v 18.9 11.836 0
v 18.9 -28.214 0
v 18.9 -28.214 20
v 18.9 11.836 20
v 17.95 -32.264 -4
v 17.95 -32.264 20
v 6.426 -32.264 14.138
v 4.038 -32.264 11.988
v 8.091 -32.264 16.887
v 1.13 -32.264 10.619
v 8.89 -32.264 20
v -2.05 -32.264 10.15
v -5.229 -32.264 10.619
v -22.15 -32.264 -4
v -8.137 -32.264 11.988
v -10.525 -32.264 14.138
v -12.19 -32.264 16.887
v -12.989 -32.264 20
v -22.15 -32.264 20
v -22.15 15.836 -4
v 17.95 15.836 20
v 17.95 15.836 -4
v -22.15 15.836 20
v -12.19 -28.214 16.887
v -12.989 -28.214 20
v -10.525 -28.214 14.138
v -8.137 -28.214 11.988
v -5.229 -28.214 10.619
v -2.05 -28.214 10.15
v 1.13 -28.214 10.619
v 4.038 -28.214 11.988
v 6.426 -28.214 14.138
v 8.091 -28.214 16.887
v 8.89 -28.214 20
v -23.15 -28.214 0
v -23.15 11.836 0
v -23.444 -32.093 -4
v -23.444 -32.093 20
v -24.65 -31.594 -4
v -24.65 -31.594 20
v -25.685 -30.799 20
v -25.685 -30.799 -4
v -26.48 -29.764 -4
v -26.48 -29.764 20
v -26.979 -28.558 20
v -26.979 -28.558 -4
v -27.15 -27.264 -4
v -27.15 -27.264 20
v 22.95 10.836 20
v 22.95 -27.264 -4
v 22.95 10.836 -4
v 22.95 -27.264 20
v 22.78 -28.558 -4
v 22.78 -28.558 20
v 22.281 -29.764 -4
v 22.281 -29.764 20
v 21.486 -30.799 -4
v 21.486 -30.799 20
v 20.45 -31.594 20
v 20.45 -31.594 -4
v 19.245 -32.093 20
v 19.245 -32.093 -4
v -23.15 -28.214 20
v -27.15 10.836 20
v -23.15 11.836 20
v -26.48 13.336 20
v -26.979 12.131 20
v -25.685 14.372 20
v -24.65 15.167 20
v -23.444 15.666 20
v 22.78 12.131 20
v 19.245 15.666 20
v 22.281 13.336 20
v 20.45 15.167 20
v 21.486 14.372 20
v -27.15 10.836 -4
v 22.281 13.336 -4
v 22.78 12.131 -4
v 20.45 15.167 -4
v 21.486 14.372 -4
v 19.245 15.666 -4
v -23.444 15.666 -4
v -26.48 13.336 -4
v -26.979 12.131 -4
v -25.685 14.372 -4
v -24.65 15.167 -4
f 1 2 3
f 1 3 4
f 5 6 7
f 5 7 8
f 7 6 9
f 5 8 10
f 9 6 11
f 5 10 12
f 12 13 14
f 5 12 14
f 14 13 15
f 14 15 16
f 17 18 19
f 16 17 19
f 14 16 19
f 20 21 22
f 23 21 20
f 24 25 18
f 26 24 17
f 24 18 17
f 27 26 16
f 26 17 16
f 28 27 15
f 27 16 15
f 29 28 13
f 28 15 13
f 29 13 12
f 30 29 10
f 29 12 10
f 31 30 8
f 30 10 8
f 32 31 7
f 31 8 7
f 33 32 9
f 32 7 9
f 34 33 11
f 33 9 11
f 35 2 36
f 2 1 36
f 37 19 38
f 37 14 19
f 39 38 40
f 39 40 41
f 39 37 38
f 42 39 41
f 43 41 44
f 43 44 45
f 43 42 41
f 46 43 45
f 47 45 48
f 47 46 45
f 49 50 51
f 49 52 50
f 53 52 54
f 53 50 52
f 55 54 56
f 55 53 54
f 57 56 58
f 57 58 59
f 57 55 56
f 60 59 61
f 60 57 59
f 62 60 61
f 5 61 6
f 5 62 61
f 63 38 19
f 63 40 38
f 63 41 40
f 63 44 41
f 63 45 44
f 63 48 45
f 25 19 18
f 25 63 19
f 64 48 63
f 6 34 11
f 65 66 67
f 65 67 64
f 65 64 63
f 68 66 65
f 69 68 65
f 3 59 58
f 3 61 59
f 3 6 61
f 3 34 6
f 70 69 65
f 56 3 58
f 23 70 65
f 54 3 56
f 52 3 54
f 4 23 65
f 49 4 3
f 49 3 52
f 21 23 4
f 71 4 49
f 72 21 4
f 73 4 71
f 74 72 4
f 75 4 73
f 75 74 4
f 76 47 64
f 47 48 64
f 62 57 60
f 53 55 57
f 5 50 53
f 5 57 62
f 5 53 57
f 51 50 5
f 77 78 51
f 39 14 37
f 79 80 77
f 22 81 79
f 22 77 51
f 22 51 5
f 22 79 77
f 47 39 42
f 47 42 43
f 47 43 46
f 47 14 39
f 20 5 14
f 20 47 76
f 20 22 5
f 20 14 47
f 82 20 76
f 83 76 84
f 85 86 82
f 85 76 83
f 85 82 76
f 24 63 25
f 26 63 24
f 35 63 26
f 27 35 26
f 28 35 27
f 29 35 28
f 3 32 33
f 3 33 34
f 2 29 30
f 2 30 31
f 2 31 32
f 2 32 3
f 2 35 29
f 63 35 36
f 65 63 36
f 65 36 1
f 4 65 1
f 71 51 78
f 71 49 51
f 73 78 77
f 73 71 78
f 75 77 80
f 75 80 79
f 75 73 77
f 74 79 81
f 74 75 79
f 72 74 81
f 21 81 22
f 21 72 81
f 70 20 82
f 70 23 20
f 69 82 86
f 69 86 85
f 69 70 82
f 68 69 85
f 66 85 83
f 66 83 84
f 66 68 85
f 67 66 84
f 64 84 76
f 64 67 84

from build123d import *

# Parameters (mm, degrees)
ESBO_O1_W                = 50.1
ESBO_O1_H                = 48.1
ESBO_O1_W_2              = 42.05
ESBO_O1_H_2              = 40.05
RESSALTO_EXTRUS_O1_DEPTH = 20
ESBO_O3_W                = 50.1
ESBO_O3_H                = 48.1
RESSALTO_EXTRUS_O3_DEPTH = 4
ESBO_O4_R                = 11
CORTE_EXTRUS_O1_DEPTH    = 14
FILETE2_R                = 5


with BuildPart() as part:
    # Esboço1 → Ressalto-extrusão1 (new body)
    with BuildSketch(Plane.XY):
        with Locations((-2.099570717, -8.213533835)):
            Rectangle(ESBO_O1_W, ESBO_O1_H)
        with Locations((-2.124570717, -8.188533835)):
            Rectangle(ESBO_O1_W_2, ESBO_O1_H_2, mode=Mode.SUBTRACT)
    extrude(amount=RESSALTO_EXTRUS_O1_DEPTH)

    # Esboço3 → Ressalto-extrusão3 (add)
    with BuildSketch(Plane(origin=(0, 0, 0), x_dir=(-1, 0, 0), z_dir=(0, 0, -1))):
        with Locations((2.099570717, -8.213533835)):
            Rectangle(ESBO_O3_W, ESBO_O3_H)
    extrude(amount=RESSALTO_EXTRUS_O3_DEPTH)

    # Esboço4 → Corte-extrusão1 (cut)
    with BuildSketch(Plane.XZ.offset(32.263533835)):
        with Locations((-2.049570717, 21.15)):
            Circle(ESBO_O4_R)
    extrude(amount=-CORTE_EXTRUS_O1_DEPTH, mode=Mode.SUBTRACT)

    # Filete2
    filete2_edges = [part.edges().sort_by_distance(p)[0] for p in [
        (-27.149570717, 15.836466165, 8),
        (22.950429283, 15.836466165, 8),
        (22.950429283, -32.263533835, 8),
        (-27.149570717, -32.263533835, 8),
    ]]
    fillet(filete2_edges, radius=FILETE2_R)


solid = part.part
